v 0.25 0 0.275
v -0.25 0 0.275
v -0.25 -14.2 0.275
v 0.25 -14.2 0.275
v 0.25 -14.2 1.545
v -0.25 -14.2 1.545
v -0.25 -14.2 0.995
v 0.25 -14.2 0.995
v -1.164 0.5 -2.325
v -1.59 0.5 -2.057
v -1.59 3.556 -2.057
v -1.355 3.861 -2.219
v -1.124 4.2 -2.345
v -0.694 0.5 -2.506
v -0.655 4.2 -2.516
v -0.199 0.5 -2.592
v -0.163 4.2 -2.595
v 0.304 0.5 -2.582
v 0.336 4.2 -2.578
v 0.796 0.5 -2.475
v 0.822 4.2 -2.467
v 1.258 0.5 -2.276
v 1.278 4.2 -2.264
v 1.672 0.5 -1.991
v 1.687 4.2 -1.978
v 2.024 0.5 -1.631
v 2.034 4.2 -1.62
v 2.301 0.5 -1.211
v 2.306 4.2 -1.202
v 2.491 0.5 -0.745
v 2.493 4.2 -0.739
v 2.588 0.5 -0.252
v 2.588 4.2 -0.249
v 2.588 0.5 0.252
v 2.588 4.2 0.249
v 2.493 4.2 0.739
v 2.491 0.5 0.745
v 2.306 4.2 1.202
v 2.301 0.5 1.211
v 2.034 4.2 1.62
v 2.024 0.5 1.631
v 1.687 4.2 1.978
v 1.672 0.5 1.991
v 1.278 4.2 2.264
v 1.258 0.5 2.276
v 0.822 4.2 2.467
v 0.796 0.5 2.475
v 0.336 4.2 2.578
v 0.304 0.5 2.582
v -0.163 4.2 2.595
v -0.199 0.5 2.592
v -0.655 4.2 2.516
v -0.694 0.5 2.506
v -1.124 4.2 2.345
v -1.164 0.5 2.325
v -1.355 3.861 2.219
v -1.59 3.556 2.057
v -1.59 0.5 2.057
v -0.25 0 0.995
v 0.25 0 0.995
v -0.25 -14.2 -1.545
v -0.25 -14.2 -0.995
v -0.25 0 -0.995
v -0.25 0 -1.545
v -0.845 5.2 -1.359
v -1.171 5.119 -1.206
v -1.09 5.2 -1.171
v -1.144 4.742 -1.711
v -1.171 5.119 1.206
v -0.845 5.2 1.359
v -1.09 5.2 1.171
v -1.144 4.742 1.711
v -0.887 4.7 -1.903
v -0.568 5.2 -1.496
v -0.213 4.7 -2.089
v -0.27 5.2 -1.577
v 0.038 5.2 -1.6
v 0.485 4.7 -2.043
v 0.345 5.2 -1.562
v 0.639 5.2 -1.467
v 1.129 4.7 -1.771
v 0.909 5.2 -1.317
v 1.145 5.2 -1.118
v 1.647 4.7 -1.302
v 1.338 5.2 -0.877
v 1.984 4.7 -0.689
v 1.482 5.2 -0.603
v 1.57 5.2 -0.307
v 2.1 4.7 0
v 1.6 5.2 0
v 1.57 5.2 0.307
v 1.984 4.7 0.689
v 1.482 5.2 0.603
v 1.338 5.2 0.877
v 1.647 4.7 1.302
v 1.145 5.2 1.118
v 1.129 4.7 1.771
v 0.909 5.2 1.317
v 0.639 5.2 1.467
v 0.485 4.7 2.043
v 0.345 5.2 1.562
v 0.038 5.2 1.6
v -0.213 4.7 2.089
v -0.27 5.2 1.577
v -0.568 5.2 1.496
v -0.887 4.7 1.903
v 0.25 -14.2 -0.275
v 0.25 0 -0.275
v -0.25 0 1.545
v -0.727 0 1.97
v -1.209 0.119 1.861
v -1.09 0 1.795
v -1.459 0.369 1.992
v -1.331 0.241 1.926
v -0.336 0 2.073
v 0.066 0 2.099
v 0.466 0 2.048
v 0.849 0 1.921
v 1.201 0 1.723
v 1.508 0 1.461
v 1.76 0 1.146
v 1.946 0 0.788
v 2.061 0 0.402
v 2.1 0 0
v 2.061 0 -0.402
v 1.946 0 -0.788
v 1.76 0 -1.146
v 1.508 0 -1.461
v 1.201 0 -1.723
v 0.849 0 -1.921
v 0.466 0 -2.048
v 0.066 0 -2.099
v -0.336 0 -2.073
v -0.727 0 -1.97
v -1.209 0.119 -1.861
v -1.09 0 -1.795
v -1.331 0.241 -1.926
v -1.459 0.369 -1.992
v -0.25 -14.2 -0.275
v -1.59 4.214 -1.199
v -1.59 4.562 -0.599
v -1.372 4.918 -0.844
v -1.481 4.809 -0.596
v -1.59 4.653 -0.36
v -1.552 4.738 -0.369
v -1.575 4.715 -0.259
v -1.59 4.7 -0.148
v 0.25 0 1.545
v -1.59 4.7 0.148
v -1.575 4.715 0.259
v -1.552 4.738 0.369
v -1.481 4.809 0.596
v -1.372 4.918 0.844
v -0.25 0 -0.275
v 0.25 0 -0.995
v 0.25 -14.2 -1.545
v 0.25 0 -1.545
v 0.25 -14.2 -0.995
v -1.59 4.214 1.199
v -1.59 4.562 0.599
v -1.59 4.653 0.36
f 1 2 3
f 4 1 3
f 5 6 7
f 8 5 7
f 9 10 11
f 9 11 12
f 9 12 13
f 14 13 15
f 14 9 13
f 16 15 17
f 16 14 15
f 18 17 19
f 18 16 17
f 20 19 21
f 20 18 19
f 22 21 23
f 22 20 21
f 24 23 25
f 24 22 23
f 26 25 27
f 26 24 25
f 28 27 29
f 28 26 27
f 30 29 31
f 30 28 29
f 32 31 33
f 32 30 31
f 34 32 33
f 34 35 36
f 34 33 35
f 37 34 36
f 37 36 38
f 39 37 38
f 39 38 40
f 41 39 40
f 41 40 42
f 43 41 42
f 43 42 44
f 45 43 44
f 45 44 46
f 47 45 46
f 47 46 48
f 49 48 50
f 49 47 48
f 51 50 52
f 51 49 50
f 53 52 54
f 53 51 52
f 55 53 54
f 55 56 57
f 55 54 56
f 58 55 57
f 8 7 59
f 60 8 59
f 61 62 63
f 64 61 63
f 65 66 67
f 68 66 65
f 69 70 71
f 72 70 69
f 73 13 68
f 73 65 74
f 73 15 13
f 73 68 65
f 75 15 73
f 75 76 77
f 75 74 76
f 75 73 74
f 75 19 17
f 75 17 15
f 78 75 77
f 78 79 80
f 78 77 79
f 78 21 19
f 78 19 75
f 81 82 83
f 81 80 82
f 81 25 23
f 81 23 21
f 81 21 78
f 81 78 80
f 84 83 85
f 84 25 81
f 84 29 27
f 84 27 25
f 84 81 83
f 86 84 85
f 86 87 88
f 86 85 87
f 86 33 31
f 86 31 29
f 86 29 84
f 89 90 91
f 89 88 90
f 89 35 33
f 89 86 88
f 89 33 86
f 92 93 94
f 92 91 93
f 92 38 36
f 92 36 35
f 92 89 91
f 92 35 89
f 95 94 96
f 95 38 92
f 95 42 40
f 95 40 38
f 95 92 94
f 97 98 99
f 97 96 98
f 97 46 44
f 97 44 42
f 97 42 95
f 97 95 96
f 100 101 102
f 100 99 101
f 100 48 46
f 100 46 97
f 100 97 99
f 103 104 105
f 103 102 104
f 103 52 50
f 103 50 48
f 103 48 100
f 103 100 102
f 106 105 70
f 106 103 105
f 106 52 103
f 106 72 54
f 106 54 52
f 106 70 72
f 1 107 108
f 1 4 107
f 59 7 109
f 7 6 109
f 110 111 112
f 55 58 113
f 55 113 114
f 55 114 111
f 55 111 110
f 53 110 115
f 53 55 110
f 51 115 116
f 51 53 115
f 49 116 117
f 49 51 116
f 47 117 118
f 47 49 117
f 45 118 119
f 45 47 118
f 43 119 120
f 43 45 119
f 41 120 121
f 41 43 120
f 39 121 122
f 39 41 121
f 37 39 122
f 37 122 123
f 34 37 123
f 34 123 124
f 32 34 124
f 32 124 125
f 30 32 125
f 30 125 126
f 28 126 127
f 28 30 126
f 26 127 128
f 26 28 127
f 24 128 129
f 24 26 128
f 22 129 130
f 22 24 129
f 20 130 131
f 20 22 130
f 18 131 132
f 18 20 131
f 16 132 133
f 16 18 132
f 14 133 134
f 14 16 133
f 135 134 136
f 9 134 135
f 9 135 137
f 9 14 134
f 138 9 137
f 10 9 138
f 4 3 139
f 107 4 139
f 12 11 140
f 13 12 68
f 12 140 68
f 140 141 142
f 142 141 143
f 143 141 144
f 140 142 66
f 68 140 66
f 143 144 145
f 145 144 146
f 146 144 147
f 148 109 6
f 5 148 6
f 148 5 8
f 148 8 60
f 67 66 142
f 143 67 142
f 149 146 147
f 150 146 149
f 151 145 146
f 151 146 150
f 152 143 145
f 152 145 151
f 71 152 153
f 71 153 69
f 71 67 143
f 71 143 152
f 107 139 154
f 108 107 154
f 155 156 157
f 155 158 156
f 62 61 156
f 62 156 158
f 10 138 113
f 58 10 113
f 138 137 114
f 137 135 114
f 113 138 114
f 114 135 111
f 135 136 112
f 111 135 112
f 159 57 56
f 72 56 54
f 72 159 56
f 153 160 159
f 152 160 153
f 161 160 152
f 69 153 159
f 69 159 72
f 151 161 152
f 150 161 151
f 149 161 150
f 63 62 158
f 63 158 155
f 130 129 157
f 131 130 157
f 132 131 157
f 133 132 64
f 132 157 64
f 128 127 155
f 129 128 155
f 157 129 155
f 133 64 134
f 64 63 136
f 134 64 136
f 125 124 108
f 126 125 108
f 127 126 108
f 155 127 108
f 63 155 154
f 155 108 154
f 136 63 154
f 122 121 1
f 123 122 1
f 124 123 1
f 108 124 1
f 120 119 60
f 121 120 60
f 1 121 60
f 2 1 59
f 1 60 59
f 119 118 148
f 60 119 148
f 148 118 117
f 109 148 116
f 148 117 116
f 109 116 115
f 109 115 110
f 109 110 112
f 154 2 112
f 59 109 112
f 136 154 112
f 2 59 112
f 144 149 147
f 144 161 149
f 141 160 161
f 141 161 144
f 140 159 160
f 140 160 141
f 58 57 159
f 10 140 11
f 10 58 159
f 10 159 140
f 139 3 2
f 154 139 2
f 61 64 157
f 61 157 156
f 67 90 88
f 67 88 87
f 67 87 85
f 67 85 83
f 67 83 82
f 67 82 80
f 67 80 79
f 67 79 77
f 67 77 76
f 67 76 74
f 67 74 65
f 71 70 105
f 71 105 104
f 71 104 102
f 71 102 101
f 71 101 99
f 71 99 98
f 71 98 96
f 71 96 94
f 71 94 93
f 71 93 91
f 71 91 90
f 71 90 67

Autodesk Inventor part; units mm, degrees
ref_plane "YZ Plane" through (0, 0, 0) normal (1, 0, 0) x (0, 1, 0)
ref_plane "XZ Plane" through (0, 0, 0) normal (0, 1, 0) x (-1, 0, 0)
ref_plane "XY Plane" through (0, 0, 0) normal (0, 0, 1) x (1, 0, 0)
sketch "Sketch1" plane through (0, 0, 0) normal (0, 1, 0) x (-1, 0, 0)
  circle A0 centre (0, 0) radius 2.6
  line L0 (1.59, 2.0572) -> (1.59, -2.0572)
  dimension "d0" = 5.2
  dimension "d1" = 4.19
extrude "Extrusion1" add sketch "Sketch1" along normal blind 5.2 contours L0 A0 picked at (-1.6247, 0.0943)
sketch "Sketch2" plane through (0, 0, 0) normal (1, 0, 0) x (0, 1, 0)
  line L0 (0, 1.545) -> (-14.2, 1.545)
  line L1 (-14.2, 1.545) -> (-14.2, 0.995)
  line L2 (-14.2, 0.995) -> (0, 0.995)
  line L3 (0, 0.995) -> (0, 1.545)
  line L4 (0, 0.275) -> (-14.2, 0.275)
  line L5 (-14.2, 0.275) -> (-14.2, -0.275)
  line L6 (-14.2, -0.275) -> (0, -0.275)
  line L7 (0, -0.275) -> (0, 0.275)
  line L8 (0, -1.545) -> (-14.2, -1.545)
  line L9 (-14.2, -1.545) -> (-14.2, -0.995)
  line L10 (-14.2, -0.995) -> (0, -0.995)
  line L11 (0, -0.995) -> (0, -1.545)
  line L12 (0, -2.6) -> (0, 2.6) projected
  point P0 (0, 0)
  point P1 (0, 2.0572)
  point P2 (0, -2.0572)
  dimension "d4" = 14.2
  dimension "d5" = 14.2
  dimension "d6" = 14.2
  dimension "d7" = 0
  dimension "d8" = 0
  dimension "d9" = 0.55
  dimension "d10" = 0.55
  dimension "d11" = 0.55
  dimension "d12" = 0.275
  dimension "d13" = 0.995
  dimension "d14" = 0.995
extrude "Extrusion2" add sketch "Sketch2" along normal mid plane 0.5
chamfer "Chamfer1" distance 1 angle 45 1 edges at (2.6, 5.2, 0)
chamfer "Chamfer2" distance 0.5 angle 45 1 edges at (2.6, 0, 0)
chamfer "Chamfer3" distance 0.5 angle 45 3 edges at (-1.59, 4.9218, -0.9998) (-1.59, 4.9218, 0.9998) (-1.59, 5.2, 0)
chamfer "Chamfer4" distance 0.5 angle 45 1 edges at (-1.59, 0, 0)
properties part number "LM35CAZ"
